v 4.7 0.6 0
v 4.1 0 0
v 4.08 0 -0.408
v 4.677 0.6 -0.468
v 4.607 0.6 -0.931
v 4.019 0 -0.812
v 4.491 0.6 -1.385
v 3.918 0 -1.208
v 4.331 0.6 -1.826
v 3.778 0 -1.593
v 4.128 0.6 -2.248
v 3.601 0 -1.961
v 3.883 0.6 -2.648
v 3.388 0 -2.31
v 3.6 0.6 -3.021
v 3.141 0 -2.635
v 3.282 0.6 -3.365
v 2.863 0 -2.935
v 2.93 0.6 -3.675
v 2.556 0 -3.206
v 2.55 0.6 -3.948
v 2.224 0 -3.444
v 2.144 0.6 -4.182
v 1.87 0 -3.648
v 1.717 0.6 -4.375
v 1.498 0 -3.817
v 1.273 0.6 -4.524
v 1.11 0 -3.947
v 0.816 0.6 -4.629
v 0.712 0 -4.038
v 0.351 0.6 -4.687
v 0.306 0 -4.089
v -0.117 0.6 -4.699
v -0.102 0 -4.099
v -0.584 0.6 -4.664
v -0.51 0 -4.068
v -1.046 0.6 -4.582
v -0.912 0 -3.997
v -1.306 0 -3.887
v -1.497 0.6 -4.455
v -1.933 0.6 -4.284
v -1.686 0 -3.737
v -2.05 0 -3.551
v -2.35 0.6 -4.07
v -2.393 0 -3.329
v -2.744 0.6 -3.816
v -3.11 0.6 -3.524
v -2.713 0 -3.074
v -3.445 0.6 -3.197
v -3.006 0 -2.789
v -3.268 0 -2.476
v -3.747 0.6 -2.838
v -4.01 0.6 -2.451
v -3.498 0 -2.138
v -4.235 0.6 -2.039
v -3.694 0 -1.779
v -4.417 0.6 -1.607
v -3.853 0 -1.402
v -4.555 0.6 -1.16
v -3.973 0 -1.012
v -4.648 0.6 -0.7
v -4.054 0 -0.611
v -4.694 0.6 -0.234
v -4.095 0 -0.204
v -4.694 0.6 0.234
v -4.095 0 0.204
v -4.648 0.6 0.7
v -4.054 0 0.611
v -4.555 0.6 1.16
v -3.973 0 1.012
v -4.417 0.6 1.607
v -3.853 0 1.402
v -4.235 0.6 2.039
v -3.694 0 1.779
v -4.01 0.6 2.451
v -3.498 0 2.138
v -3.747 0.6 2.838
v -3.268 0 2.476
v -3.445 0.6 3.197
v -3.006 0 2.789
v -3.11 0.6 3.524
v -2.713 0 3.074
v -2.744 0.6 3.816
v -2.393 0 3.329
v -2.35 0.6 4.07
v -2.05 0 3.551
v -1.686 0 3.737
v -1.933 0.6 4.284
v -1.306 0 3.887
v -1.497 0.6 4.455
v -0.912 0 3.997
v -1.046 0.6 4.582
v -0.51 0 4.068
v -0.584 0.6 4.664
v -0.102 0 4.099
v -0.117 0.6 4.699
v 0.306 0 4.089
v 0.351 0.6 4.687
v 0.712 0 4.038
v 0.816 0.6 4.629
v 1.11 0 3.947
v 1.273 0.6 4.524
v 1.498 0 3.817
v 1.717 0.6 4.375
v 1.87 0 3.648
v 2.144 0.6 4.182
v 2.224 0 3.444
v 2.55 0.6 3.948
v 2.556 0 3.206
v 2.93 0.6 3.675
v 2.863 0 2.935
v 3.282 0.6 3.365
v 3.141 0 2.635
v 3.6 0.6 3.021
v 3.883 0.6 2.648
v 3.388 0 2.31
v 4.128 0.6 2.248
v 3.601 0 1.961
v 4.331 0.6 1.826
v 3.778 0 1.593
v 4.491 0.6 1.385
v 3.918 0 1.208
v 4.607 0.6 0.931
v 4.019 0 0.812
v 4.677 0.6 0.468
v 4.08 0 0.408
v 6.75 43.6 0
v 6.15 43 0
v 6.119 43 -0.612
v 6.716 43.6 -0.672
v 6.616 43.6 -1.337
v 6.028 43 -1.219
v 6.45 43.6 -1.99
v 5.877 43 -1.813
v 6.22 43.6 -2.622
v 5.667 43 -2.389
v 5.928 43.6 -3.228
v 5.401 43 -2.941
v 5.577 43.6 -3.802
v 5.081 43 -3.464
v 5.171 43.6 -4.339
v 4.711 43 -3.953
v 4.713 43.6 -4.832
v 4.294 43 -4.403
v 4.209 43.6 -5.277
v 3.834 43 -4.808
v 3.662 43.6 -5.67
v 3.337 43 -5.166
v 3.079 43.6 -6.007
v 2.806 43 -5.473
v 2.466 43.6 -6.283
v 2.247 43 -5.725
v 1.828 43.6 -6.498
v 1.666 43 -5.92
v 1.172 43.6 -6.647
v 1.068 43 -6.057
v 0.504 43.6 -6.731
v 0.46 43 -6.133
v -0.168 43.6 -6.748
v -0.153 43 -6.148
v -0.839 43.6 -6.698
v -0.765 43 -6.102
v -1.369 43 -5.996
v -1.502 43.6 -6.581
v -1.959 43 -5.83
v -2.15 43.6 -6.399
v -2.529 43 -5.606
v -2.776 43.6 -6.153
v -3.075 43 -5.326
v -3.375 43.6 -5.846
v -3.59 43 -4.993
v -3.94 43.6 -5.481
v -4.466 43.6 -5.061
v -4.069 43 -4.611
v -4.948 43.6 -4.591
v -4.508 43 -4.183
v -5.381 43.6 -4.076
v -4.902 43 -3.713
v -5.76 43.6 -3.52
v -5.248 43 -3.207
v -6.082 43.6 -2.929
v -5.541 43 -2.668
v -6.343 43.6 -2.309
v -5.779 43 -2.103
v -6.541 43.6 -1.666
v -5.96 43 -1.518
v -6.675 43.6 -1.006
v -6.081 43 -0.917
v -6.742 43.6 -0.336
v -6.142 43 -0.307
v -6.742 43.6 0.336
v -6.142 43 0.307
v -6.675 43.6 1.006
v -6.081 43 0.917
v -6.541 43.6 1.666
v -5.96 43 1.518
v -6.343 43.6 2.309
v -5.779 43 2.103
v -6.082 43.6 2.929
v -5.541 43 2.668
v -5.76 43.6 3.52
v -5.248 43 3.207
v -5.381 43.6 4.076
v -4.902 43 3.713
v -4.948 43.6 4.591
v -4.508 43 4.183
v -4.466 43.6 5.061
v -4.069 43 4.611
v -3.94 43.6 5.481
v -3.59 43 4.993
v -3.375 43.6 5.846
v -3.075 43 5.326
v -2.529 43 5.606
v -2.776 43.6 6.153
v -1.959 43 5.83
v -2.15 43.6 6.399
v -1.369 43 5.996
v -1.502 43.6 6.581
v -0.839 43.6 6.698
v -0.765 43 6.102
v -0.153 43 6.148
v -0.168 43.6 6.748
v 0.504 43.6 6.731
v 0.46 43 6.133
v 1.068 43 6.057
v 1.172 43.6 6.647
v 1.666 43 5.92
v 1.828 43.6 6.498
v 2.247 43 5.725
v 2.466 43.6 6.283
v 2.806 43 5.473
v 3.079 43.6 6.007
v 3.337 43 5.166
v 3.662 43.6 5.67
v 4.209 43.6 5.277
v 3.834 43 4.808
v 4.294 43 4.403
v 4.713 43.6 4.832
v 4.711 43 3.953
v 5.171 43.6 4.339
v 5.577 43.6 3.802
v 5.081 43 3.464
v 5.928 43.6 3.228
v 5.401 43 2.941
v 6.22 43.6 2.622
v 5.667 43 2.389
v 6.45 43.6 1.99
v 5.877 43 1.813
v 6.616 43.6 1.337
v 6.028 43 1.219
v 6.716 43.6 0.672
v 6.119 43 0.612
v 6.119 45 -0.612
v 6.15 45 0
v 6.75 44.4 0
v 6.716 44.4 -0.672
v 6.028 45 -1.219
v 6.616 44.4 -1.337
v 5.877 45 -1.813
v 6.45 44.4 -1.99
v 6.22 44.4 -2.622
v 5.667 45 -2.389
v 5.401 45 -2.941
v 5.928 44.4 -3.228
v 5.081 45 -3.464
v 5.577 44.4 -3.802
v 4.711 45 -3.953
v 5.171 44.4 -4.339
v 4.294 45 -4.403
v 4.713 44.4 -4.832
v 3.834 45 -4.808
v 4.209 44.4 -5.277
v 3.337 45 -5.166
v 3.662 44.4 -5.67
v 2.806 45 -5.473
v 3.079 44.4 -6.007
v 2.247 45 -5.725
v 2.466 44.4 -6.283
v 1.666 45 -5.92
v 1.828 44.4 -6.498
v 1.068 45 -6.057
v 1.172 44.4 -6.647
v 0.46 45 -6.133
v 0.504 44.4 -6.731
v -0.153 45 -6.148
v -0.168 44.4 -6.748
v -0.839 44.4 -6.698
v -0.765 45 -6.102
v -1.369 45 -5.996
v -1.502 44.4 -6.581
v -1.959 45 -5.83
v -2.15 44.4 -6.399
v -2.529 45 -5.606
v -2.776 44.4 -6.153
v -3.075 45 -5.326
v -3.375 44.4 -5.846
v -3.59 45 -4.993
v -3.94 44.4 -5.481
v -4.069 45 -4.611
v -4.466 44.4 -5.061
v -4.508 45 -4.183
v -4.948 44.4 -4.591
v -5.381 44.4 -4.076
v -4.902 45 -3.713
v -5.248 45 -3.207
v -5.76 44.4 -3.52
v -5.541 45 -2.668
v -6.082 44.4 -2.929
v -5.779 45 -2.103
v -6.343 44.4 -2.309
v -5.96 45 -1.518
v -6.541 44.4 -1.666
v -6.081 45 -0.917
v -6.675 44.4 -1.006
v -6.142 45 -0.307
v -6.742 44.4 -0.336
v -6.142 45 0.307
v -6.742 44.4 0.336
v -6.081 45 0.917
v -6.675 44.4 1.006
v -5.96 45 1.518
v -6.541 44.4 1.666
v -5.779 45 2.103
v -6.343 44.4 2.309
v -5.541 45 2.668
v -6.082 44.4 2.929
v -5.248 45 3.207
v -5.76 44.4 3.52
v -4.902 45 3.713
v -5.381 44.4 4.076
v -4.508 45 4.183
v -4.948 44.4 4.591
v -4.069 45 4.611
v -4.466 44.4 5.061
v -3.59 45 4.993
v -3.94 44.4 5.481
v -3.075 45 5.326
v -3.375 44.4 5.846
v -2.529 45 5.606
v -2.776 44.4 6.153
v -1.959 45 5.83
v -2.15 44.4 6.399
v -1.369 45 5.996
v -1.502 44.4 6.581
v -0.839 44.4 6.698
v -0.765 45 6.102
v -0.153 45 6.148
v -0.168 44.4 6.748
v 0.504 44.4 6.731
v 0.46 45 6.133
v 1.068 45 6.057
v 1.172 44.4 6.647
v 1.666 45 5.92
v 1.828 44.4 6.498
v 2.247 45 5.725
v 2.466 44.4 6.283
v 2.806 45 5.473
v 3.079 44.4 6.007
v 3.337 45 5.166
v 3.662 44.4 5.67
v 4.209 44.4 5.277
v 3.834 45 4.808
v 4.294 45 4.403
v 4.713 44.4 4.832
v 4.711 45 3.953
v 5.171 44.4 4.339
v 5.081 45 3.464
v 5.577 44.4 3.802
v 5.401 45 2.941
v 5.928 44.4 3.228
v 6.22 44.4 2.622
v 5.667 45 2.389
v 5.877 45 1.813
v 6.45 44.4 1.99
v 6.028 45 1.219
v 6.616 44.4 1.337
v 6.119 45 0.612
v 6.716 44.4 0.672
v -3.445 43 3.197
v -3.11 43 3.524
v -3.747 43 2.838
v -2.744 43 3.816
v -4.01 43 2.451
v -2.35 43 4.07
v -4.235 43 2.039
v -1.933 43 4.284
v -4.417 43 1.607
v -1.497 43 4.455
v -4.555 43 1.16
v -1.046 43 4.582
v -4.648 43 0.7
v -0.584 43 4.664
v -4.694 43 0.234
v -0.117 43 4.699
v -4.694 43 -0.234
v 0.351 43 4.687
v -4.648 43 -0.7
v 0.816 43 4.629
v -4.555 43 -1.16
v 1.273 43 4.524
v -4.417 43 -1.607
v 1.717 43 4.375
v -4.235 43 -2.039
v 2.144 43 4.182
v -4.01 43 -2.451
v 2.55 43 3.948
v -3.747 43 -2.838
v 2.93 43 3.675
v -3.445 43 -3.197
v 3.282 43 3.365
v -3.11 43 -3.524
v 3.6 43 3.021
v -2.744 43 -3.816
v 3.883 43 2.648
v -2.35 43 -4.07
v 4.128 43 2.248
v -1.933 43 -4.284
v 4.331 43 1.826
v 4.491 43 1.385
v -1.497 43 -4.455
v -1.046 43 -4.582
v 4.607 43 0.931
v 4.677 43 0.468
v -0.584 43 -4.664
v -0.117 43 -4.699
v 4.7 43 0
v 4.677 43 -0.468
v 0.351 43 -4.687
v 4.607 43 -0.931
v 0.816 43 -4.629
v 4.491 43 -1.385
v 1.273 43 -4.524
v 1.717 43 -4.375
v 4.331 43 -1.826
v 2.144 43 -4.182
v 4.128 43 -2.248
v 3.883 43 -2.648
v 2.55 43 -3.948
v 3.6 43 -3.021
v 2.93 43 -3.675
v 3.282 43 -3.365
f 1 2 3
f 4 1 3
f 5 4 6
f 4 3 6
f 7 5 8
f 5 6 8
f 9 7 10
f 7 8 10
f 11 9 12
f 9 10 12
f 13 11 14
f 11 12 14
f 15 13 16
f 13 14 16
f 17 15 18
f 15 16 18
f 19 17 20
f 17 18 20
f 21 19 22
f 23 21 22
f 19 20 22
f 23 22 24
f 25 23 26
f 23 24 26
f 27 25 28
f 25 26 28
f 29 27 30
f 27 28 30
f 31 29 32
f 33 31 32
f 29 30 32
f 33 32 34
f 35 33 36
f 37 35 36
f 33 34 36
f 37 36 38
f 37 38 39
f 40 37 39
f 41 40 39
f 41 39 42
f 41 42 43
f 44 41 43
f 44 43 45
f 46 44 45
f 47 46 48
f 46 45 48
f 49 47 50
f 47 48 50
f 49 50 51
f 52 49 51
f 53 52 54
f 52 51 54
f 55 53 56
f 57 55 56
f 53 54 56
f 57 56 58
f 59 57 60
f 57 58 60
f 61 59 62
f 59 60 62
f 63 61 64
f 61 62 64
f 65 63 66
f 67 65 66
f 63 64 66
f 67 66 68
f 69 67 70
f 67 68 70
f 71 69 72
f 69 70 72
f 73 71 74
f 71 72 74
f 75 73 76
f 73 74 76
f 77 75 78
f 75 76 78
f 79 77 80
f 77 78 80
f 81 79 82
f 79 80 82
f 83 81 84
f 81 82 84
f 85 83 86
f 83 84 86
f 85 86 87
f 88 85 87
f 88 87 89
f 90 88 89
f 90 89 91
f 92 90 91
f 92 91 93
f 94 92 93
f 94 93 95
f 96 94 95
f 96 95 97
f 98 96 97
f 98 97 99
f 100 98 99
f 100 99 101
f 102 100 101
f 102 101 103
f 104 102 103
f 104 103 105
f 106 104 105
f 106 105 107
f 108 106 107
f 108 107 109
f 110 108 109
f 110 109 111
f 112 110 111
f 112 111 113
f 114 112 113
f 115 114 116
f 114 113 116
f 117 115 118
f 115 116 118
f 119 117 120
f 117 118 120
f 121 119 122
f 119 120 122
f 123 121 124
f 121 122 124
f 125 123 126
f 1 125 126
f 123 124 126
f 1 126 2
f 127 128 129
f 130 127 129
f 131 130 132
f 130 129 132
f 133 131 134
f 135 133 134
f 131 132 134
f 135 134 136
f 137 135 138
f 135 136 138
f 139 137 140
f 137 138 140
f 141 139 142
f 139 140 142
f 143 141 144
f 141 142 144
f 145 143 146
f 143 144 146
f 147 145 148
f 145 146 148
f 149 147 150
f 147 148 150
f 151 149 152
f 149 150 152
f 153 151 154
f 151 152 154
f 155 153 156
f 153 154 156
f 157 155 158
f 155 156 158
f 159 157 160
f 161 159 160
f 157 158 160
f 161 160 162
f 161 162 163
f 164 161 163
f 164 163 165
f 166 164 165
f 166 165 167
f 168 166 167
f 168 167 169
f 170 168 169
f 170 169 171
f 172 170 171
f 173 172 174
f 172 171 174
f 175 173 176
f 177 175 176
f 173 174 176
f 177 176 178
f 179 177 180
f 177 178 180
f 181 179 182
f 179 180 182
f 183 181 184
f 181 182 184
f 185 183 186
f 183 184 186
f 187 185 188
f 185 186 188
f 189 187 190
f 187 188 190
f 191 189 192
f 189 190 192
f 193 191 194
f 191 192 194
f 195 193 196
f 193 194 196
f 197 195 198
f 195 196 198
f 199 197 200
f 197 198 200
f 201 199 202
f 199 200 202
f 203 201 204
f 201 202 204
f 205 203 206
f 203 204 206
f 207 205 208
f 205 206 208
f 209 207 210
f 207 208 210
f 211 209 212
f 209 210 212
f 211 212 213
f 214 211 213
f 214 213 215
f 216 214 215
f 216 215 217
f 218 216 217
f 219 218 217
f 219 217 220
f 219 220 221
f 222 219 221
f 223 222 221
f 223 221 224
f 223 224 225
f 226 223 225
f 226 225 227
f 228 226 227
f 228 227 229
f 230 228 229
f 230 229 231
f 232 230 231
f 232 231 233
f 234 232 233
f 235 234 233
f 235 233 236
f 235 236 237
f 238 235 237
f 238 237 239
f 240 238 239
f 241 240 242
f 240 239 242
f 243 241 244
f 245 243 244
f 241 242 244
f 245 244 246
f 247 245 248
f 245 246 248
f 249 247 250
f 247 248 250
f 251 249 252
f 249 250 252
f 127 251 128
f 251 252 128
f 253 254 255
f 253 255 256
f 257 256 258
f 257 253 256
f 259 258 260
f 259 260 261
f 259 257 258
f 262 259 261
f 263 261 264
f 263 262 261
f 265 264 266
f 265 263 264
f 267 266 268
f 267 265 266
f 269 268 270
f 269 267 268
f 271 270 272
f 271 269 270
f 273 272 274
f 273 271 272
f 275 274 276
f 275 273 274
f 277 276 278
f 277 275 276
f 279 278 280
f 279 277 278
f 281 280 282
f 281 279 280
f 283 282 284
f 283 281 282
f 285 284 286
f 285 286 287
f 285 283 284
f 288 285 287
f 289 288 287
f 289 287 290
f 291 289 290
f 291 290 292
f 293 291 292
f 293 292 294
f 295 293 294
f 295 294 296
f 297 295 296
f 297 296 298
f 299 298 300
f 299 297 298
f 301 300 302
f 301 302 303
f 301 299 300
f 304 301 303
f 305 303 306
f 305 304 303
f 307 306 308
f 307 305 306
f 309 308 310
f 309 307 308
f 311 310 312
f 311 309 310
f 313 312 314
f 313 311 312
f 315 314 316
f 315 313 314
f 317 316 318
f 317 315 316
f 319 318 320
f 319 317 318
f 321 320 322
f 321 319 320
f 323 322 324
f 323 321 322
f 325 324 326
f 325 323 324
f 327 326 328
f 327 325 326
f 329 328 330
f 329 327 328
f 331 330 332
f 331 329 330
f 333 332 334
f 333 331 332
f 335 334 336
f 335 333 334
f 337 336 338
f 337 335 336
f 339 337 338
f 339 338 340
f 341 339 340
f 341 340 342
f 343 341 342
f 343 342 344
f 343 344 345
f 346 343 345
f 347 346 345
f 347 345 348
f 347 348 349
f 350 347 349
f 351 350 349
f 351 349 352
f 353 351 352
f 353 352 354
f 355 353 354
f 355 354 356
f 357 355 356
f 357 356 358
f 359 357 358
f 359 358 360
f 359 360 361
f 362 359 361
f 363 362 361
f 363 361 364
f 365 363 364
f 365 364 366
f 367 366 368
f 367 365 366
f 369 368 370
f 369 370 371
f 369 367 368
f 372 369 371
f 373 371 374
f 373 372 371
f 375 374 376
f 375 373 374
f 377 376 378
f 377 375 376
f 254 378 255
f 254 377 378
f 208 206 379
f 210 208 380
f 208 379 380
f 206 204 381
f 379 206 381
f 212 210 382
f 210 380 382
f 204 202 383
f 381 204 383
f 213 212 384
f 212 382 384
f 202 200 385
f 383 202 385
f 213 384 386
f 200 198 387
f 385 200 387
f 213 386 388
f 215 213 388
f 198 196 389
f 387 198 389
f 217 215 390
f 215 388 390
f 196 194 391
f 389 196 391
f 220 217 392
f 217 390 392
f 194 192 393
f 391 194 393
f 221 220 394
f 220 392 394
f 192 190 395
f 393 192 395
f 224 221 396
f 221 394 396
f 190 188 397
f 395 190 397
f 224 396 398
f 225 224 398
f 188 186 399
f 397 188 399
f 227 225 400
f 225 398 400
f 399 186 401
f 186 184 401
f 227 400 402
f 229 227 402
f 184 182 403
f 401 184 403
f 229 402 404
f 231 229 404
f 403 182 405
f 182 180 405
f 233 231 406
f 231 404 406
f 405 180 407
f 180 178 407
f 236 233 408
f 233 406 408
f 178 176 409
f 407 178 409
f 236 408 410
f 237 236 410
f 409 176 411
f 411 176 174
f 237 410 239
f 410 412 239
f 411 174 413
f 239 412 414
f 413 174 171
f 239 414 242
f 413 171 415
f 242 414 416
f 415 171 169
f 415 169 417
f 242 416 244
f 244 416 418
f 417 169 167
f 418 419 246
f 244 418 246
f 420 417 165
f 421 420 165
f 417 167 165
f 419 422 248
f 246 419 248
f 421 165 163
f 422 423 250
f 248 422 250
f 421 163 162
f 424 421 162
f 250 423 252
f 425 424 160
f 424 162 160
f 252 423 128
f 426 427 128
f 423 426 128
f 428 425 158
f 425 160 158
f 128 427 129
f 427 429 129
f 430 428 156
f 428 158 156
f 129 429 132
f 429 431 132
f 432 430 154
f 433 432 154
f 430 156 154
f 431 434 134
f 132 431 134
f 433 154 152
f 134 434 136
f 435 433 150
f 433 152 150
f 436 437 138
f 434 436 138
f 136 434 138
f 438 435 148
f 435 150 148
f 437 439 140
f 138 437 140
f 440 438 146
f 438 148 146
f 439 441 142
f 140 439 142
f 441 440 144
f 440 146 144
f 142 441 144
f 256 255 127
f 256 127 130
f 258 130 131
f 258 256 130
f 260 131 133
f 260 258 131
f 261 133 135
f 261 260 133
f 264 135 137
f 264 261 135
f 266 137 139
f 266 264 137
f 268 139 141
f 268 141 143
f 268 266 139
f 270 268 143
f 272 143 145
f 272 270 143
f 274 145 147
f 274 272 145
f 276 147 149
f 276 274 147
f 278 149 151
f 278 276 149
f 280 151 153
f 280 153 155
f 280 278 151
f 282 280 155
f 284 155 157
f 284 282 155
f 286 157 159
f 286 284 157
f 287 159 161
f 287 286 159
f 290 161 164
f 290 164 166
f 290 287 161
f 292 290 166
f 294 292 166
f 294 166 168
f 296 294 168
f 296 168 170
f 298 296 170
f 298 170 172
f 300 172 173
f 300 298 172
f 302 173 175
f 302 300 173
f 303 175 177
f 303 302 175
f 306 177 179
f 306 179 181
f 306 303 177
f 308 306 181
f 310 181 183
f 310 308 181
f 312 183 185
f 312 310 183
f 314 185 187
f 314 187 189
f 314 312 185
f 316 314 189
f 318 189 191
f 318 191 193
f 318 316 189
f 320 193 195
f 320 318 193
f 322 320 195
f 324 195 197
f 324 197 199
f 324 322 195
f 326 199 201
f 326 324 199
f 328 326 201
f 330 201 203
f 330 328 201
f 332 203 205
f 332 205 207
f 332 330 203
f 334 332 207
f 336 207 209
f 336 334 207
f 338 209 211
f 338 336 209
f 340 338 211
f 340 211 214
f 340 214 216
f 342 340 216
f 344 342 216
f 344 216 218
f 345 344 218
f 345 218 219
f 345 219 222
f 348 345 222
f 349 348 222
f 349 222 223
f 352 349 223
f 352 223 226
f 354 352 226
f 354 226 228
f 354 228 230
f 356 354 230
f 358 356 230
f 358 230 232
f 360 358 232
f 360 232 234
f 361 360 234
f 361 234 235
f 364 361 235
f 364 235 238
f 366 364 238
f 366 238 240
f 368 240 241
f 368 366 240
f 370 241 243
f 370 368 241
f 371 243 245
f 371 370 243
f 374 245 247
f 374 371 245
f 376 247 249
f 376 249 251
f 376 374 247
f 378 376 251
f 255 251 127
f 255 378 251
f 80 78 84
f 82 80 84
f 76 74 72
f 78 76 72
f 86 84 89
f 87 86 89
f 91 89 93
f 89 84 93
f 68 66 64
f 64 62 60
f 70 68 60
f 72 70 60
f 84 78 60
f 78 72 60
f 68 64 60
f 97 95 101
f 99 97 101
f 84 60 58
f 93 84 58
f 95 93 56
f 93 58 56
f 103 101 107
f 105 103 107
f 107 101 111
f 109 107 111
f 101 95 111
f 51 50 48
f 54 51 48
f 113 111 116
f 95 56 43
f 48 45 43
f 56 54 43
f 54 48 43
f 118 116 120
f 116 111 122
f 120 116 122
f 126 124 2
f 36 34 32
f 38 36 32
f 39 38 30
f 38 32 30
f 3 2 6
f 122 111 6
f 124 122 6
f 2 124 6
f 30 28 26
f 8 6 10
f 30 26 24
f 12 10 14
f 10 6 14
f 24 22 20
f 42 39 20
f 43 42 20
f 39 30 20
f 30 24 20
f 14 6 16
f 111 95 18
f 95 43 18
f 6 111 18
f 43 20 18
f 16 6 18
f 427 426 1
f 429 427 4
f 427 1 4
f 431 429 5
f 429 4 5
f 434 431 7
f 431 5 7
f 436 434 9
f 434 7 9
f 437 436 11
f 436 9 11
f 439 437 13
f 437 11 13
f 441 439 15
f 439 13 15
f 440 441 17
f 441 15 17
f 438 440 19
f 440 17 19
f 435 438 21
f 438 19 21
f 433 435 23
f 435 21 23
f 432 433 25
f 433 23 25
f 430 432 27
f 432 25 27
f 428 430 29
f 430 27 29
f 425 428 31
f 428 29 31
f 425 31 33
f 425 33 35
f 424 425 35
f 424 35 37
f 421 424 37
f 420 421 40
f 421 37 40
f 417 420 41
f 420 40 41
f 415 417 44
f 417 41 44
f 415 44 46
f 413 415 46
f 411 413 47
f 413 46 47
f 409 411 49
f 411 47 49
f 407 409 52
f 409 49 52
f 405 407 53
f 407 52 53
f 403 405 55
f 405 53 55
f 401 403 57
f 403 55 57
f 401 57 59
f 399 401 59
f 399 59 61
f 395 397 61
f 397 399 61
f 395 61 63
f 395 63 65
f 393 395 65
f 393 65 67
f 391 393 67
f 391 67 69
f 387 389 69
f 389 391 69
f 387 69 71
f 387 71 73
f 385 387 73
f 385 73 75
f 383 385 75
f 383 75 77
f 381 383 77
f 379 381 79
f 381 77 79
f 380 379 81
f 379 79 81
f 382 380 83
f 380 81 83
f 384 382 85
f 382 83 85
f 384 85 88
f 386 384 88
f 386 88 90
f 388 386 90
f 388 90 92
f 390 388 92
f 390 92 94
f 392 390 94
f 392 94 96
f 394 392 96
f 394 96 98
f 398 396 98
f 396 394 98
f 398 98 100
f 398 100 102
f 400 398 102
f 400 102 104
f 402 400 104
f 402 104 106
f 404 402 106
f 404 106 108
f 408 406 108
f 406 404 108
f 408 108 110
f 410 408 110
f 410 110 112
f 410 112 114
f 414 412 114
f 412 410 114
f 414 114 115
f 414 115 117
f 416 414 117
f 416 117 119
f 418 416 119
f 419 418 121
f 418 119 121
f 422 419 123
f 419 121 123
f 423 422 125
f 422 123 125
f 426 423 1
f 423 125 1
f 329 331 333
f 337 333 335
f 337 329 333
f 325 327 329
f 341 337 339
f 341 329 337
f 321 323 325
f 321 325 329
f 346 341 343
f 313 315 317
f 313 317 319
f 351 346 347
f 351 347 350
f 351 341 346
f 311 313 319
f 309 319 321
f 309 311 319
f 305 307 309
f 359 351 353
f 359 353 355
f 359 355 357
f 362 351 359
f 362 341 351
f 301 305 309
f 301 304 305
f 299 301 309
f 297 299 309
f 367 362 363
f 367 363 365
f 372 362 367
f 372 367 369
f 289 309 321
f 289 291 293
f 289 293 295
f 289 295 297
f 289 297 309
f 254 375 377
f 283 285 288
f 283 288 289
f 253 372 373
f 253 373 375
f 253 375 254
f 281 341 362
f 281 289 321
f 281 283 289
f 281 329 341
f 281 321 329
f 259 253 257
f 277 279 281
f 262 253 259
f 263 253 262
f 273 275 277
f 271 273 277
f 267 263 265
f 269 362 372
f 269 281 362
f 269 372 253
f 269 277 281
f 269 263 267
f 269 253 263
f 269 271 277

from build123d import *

# Parameters (mm, degrees)
SKETCH2_R           = 4.7
BOSS_EXTRUDE1_DEPTH = 45
SKETCH3_R           = 6.75
BOSS_EXTRUDE2_DEPTH = 2
CHAMFER1_SIZE       = 0.6


with BuildPart() as part:
    # Sketch2 → Boss-Extrude1 (new body)
    with BuildSketch(Plane(origin=(0, 0, 0), x_dir=(1, 0, 0), z_dir=(0, 1, 0))):
        Circle(SKETCH2_R)
    extrude(amount=BOSS_EXTRUDE1_DEPTH)

    # Sketch3 → Boss-Extrude2 (add)
    with BuildSketch(Plane(origin=(0, 45, 0), x_dir=(1, 0, 0), z_dir=(0, 1, 0))):
        Circle(SKETCH3_R)
    extrude(amount=-BOSS_EXTRUDE2_DEPTH)

    # Chamfer1
    chamfer1_edges = [part.edges().sort_by_distance(p)[0] for p in [
        (-4.7, 0, 0),
        (-6.75, 45, 0),
        (-6.75, 43, 0),
    ]]
    chamfer(chamfer1_edges, length=CHAMFER1_SIZE)


solid = part.part
